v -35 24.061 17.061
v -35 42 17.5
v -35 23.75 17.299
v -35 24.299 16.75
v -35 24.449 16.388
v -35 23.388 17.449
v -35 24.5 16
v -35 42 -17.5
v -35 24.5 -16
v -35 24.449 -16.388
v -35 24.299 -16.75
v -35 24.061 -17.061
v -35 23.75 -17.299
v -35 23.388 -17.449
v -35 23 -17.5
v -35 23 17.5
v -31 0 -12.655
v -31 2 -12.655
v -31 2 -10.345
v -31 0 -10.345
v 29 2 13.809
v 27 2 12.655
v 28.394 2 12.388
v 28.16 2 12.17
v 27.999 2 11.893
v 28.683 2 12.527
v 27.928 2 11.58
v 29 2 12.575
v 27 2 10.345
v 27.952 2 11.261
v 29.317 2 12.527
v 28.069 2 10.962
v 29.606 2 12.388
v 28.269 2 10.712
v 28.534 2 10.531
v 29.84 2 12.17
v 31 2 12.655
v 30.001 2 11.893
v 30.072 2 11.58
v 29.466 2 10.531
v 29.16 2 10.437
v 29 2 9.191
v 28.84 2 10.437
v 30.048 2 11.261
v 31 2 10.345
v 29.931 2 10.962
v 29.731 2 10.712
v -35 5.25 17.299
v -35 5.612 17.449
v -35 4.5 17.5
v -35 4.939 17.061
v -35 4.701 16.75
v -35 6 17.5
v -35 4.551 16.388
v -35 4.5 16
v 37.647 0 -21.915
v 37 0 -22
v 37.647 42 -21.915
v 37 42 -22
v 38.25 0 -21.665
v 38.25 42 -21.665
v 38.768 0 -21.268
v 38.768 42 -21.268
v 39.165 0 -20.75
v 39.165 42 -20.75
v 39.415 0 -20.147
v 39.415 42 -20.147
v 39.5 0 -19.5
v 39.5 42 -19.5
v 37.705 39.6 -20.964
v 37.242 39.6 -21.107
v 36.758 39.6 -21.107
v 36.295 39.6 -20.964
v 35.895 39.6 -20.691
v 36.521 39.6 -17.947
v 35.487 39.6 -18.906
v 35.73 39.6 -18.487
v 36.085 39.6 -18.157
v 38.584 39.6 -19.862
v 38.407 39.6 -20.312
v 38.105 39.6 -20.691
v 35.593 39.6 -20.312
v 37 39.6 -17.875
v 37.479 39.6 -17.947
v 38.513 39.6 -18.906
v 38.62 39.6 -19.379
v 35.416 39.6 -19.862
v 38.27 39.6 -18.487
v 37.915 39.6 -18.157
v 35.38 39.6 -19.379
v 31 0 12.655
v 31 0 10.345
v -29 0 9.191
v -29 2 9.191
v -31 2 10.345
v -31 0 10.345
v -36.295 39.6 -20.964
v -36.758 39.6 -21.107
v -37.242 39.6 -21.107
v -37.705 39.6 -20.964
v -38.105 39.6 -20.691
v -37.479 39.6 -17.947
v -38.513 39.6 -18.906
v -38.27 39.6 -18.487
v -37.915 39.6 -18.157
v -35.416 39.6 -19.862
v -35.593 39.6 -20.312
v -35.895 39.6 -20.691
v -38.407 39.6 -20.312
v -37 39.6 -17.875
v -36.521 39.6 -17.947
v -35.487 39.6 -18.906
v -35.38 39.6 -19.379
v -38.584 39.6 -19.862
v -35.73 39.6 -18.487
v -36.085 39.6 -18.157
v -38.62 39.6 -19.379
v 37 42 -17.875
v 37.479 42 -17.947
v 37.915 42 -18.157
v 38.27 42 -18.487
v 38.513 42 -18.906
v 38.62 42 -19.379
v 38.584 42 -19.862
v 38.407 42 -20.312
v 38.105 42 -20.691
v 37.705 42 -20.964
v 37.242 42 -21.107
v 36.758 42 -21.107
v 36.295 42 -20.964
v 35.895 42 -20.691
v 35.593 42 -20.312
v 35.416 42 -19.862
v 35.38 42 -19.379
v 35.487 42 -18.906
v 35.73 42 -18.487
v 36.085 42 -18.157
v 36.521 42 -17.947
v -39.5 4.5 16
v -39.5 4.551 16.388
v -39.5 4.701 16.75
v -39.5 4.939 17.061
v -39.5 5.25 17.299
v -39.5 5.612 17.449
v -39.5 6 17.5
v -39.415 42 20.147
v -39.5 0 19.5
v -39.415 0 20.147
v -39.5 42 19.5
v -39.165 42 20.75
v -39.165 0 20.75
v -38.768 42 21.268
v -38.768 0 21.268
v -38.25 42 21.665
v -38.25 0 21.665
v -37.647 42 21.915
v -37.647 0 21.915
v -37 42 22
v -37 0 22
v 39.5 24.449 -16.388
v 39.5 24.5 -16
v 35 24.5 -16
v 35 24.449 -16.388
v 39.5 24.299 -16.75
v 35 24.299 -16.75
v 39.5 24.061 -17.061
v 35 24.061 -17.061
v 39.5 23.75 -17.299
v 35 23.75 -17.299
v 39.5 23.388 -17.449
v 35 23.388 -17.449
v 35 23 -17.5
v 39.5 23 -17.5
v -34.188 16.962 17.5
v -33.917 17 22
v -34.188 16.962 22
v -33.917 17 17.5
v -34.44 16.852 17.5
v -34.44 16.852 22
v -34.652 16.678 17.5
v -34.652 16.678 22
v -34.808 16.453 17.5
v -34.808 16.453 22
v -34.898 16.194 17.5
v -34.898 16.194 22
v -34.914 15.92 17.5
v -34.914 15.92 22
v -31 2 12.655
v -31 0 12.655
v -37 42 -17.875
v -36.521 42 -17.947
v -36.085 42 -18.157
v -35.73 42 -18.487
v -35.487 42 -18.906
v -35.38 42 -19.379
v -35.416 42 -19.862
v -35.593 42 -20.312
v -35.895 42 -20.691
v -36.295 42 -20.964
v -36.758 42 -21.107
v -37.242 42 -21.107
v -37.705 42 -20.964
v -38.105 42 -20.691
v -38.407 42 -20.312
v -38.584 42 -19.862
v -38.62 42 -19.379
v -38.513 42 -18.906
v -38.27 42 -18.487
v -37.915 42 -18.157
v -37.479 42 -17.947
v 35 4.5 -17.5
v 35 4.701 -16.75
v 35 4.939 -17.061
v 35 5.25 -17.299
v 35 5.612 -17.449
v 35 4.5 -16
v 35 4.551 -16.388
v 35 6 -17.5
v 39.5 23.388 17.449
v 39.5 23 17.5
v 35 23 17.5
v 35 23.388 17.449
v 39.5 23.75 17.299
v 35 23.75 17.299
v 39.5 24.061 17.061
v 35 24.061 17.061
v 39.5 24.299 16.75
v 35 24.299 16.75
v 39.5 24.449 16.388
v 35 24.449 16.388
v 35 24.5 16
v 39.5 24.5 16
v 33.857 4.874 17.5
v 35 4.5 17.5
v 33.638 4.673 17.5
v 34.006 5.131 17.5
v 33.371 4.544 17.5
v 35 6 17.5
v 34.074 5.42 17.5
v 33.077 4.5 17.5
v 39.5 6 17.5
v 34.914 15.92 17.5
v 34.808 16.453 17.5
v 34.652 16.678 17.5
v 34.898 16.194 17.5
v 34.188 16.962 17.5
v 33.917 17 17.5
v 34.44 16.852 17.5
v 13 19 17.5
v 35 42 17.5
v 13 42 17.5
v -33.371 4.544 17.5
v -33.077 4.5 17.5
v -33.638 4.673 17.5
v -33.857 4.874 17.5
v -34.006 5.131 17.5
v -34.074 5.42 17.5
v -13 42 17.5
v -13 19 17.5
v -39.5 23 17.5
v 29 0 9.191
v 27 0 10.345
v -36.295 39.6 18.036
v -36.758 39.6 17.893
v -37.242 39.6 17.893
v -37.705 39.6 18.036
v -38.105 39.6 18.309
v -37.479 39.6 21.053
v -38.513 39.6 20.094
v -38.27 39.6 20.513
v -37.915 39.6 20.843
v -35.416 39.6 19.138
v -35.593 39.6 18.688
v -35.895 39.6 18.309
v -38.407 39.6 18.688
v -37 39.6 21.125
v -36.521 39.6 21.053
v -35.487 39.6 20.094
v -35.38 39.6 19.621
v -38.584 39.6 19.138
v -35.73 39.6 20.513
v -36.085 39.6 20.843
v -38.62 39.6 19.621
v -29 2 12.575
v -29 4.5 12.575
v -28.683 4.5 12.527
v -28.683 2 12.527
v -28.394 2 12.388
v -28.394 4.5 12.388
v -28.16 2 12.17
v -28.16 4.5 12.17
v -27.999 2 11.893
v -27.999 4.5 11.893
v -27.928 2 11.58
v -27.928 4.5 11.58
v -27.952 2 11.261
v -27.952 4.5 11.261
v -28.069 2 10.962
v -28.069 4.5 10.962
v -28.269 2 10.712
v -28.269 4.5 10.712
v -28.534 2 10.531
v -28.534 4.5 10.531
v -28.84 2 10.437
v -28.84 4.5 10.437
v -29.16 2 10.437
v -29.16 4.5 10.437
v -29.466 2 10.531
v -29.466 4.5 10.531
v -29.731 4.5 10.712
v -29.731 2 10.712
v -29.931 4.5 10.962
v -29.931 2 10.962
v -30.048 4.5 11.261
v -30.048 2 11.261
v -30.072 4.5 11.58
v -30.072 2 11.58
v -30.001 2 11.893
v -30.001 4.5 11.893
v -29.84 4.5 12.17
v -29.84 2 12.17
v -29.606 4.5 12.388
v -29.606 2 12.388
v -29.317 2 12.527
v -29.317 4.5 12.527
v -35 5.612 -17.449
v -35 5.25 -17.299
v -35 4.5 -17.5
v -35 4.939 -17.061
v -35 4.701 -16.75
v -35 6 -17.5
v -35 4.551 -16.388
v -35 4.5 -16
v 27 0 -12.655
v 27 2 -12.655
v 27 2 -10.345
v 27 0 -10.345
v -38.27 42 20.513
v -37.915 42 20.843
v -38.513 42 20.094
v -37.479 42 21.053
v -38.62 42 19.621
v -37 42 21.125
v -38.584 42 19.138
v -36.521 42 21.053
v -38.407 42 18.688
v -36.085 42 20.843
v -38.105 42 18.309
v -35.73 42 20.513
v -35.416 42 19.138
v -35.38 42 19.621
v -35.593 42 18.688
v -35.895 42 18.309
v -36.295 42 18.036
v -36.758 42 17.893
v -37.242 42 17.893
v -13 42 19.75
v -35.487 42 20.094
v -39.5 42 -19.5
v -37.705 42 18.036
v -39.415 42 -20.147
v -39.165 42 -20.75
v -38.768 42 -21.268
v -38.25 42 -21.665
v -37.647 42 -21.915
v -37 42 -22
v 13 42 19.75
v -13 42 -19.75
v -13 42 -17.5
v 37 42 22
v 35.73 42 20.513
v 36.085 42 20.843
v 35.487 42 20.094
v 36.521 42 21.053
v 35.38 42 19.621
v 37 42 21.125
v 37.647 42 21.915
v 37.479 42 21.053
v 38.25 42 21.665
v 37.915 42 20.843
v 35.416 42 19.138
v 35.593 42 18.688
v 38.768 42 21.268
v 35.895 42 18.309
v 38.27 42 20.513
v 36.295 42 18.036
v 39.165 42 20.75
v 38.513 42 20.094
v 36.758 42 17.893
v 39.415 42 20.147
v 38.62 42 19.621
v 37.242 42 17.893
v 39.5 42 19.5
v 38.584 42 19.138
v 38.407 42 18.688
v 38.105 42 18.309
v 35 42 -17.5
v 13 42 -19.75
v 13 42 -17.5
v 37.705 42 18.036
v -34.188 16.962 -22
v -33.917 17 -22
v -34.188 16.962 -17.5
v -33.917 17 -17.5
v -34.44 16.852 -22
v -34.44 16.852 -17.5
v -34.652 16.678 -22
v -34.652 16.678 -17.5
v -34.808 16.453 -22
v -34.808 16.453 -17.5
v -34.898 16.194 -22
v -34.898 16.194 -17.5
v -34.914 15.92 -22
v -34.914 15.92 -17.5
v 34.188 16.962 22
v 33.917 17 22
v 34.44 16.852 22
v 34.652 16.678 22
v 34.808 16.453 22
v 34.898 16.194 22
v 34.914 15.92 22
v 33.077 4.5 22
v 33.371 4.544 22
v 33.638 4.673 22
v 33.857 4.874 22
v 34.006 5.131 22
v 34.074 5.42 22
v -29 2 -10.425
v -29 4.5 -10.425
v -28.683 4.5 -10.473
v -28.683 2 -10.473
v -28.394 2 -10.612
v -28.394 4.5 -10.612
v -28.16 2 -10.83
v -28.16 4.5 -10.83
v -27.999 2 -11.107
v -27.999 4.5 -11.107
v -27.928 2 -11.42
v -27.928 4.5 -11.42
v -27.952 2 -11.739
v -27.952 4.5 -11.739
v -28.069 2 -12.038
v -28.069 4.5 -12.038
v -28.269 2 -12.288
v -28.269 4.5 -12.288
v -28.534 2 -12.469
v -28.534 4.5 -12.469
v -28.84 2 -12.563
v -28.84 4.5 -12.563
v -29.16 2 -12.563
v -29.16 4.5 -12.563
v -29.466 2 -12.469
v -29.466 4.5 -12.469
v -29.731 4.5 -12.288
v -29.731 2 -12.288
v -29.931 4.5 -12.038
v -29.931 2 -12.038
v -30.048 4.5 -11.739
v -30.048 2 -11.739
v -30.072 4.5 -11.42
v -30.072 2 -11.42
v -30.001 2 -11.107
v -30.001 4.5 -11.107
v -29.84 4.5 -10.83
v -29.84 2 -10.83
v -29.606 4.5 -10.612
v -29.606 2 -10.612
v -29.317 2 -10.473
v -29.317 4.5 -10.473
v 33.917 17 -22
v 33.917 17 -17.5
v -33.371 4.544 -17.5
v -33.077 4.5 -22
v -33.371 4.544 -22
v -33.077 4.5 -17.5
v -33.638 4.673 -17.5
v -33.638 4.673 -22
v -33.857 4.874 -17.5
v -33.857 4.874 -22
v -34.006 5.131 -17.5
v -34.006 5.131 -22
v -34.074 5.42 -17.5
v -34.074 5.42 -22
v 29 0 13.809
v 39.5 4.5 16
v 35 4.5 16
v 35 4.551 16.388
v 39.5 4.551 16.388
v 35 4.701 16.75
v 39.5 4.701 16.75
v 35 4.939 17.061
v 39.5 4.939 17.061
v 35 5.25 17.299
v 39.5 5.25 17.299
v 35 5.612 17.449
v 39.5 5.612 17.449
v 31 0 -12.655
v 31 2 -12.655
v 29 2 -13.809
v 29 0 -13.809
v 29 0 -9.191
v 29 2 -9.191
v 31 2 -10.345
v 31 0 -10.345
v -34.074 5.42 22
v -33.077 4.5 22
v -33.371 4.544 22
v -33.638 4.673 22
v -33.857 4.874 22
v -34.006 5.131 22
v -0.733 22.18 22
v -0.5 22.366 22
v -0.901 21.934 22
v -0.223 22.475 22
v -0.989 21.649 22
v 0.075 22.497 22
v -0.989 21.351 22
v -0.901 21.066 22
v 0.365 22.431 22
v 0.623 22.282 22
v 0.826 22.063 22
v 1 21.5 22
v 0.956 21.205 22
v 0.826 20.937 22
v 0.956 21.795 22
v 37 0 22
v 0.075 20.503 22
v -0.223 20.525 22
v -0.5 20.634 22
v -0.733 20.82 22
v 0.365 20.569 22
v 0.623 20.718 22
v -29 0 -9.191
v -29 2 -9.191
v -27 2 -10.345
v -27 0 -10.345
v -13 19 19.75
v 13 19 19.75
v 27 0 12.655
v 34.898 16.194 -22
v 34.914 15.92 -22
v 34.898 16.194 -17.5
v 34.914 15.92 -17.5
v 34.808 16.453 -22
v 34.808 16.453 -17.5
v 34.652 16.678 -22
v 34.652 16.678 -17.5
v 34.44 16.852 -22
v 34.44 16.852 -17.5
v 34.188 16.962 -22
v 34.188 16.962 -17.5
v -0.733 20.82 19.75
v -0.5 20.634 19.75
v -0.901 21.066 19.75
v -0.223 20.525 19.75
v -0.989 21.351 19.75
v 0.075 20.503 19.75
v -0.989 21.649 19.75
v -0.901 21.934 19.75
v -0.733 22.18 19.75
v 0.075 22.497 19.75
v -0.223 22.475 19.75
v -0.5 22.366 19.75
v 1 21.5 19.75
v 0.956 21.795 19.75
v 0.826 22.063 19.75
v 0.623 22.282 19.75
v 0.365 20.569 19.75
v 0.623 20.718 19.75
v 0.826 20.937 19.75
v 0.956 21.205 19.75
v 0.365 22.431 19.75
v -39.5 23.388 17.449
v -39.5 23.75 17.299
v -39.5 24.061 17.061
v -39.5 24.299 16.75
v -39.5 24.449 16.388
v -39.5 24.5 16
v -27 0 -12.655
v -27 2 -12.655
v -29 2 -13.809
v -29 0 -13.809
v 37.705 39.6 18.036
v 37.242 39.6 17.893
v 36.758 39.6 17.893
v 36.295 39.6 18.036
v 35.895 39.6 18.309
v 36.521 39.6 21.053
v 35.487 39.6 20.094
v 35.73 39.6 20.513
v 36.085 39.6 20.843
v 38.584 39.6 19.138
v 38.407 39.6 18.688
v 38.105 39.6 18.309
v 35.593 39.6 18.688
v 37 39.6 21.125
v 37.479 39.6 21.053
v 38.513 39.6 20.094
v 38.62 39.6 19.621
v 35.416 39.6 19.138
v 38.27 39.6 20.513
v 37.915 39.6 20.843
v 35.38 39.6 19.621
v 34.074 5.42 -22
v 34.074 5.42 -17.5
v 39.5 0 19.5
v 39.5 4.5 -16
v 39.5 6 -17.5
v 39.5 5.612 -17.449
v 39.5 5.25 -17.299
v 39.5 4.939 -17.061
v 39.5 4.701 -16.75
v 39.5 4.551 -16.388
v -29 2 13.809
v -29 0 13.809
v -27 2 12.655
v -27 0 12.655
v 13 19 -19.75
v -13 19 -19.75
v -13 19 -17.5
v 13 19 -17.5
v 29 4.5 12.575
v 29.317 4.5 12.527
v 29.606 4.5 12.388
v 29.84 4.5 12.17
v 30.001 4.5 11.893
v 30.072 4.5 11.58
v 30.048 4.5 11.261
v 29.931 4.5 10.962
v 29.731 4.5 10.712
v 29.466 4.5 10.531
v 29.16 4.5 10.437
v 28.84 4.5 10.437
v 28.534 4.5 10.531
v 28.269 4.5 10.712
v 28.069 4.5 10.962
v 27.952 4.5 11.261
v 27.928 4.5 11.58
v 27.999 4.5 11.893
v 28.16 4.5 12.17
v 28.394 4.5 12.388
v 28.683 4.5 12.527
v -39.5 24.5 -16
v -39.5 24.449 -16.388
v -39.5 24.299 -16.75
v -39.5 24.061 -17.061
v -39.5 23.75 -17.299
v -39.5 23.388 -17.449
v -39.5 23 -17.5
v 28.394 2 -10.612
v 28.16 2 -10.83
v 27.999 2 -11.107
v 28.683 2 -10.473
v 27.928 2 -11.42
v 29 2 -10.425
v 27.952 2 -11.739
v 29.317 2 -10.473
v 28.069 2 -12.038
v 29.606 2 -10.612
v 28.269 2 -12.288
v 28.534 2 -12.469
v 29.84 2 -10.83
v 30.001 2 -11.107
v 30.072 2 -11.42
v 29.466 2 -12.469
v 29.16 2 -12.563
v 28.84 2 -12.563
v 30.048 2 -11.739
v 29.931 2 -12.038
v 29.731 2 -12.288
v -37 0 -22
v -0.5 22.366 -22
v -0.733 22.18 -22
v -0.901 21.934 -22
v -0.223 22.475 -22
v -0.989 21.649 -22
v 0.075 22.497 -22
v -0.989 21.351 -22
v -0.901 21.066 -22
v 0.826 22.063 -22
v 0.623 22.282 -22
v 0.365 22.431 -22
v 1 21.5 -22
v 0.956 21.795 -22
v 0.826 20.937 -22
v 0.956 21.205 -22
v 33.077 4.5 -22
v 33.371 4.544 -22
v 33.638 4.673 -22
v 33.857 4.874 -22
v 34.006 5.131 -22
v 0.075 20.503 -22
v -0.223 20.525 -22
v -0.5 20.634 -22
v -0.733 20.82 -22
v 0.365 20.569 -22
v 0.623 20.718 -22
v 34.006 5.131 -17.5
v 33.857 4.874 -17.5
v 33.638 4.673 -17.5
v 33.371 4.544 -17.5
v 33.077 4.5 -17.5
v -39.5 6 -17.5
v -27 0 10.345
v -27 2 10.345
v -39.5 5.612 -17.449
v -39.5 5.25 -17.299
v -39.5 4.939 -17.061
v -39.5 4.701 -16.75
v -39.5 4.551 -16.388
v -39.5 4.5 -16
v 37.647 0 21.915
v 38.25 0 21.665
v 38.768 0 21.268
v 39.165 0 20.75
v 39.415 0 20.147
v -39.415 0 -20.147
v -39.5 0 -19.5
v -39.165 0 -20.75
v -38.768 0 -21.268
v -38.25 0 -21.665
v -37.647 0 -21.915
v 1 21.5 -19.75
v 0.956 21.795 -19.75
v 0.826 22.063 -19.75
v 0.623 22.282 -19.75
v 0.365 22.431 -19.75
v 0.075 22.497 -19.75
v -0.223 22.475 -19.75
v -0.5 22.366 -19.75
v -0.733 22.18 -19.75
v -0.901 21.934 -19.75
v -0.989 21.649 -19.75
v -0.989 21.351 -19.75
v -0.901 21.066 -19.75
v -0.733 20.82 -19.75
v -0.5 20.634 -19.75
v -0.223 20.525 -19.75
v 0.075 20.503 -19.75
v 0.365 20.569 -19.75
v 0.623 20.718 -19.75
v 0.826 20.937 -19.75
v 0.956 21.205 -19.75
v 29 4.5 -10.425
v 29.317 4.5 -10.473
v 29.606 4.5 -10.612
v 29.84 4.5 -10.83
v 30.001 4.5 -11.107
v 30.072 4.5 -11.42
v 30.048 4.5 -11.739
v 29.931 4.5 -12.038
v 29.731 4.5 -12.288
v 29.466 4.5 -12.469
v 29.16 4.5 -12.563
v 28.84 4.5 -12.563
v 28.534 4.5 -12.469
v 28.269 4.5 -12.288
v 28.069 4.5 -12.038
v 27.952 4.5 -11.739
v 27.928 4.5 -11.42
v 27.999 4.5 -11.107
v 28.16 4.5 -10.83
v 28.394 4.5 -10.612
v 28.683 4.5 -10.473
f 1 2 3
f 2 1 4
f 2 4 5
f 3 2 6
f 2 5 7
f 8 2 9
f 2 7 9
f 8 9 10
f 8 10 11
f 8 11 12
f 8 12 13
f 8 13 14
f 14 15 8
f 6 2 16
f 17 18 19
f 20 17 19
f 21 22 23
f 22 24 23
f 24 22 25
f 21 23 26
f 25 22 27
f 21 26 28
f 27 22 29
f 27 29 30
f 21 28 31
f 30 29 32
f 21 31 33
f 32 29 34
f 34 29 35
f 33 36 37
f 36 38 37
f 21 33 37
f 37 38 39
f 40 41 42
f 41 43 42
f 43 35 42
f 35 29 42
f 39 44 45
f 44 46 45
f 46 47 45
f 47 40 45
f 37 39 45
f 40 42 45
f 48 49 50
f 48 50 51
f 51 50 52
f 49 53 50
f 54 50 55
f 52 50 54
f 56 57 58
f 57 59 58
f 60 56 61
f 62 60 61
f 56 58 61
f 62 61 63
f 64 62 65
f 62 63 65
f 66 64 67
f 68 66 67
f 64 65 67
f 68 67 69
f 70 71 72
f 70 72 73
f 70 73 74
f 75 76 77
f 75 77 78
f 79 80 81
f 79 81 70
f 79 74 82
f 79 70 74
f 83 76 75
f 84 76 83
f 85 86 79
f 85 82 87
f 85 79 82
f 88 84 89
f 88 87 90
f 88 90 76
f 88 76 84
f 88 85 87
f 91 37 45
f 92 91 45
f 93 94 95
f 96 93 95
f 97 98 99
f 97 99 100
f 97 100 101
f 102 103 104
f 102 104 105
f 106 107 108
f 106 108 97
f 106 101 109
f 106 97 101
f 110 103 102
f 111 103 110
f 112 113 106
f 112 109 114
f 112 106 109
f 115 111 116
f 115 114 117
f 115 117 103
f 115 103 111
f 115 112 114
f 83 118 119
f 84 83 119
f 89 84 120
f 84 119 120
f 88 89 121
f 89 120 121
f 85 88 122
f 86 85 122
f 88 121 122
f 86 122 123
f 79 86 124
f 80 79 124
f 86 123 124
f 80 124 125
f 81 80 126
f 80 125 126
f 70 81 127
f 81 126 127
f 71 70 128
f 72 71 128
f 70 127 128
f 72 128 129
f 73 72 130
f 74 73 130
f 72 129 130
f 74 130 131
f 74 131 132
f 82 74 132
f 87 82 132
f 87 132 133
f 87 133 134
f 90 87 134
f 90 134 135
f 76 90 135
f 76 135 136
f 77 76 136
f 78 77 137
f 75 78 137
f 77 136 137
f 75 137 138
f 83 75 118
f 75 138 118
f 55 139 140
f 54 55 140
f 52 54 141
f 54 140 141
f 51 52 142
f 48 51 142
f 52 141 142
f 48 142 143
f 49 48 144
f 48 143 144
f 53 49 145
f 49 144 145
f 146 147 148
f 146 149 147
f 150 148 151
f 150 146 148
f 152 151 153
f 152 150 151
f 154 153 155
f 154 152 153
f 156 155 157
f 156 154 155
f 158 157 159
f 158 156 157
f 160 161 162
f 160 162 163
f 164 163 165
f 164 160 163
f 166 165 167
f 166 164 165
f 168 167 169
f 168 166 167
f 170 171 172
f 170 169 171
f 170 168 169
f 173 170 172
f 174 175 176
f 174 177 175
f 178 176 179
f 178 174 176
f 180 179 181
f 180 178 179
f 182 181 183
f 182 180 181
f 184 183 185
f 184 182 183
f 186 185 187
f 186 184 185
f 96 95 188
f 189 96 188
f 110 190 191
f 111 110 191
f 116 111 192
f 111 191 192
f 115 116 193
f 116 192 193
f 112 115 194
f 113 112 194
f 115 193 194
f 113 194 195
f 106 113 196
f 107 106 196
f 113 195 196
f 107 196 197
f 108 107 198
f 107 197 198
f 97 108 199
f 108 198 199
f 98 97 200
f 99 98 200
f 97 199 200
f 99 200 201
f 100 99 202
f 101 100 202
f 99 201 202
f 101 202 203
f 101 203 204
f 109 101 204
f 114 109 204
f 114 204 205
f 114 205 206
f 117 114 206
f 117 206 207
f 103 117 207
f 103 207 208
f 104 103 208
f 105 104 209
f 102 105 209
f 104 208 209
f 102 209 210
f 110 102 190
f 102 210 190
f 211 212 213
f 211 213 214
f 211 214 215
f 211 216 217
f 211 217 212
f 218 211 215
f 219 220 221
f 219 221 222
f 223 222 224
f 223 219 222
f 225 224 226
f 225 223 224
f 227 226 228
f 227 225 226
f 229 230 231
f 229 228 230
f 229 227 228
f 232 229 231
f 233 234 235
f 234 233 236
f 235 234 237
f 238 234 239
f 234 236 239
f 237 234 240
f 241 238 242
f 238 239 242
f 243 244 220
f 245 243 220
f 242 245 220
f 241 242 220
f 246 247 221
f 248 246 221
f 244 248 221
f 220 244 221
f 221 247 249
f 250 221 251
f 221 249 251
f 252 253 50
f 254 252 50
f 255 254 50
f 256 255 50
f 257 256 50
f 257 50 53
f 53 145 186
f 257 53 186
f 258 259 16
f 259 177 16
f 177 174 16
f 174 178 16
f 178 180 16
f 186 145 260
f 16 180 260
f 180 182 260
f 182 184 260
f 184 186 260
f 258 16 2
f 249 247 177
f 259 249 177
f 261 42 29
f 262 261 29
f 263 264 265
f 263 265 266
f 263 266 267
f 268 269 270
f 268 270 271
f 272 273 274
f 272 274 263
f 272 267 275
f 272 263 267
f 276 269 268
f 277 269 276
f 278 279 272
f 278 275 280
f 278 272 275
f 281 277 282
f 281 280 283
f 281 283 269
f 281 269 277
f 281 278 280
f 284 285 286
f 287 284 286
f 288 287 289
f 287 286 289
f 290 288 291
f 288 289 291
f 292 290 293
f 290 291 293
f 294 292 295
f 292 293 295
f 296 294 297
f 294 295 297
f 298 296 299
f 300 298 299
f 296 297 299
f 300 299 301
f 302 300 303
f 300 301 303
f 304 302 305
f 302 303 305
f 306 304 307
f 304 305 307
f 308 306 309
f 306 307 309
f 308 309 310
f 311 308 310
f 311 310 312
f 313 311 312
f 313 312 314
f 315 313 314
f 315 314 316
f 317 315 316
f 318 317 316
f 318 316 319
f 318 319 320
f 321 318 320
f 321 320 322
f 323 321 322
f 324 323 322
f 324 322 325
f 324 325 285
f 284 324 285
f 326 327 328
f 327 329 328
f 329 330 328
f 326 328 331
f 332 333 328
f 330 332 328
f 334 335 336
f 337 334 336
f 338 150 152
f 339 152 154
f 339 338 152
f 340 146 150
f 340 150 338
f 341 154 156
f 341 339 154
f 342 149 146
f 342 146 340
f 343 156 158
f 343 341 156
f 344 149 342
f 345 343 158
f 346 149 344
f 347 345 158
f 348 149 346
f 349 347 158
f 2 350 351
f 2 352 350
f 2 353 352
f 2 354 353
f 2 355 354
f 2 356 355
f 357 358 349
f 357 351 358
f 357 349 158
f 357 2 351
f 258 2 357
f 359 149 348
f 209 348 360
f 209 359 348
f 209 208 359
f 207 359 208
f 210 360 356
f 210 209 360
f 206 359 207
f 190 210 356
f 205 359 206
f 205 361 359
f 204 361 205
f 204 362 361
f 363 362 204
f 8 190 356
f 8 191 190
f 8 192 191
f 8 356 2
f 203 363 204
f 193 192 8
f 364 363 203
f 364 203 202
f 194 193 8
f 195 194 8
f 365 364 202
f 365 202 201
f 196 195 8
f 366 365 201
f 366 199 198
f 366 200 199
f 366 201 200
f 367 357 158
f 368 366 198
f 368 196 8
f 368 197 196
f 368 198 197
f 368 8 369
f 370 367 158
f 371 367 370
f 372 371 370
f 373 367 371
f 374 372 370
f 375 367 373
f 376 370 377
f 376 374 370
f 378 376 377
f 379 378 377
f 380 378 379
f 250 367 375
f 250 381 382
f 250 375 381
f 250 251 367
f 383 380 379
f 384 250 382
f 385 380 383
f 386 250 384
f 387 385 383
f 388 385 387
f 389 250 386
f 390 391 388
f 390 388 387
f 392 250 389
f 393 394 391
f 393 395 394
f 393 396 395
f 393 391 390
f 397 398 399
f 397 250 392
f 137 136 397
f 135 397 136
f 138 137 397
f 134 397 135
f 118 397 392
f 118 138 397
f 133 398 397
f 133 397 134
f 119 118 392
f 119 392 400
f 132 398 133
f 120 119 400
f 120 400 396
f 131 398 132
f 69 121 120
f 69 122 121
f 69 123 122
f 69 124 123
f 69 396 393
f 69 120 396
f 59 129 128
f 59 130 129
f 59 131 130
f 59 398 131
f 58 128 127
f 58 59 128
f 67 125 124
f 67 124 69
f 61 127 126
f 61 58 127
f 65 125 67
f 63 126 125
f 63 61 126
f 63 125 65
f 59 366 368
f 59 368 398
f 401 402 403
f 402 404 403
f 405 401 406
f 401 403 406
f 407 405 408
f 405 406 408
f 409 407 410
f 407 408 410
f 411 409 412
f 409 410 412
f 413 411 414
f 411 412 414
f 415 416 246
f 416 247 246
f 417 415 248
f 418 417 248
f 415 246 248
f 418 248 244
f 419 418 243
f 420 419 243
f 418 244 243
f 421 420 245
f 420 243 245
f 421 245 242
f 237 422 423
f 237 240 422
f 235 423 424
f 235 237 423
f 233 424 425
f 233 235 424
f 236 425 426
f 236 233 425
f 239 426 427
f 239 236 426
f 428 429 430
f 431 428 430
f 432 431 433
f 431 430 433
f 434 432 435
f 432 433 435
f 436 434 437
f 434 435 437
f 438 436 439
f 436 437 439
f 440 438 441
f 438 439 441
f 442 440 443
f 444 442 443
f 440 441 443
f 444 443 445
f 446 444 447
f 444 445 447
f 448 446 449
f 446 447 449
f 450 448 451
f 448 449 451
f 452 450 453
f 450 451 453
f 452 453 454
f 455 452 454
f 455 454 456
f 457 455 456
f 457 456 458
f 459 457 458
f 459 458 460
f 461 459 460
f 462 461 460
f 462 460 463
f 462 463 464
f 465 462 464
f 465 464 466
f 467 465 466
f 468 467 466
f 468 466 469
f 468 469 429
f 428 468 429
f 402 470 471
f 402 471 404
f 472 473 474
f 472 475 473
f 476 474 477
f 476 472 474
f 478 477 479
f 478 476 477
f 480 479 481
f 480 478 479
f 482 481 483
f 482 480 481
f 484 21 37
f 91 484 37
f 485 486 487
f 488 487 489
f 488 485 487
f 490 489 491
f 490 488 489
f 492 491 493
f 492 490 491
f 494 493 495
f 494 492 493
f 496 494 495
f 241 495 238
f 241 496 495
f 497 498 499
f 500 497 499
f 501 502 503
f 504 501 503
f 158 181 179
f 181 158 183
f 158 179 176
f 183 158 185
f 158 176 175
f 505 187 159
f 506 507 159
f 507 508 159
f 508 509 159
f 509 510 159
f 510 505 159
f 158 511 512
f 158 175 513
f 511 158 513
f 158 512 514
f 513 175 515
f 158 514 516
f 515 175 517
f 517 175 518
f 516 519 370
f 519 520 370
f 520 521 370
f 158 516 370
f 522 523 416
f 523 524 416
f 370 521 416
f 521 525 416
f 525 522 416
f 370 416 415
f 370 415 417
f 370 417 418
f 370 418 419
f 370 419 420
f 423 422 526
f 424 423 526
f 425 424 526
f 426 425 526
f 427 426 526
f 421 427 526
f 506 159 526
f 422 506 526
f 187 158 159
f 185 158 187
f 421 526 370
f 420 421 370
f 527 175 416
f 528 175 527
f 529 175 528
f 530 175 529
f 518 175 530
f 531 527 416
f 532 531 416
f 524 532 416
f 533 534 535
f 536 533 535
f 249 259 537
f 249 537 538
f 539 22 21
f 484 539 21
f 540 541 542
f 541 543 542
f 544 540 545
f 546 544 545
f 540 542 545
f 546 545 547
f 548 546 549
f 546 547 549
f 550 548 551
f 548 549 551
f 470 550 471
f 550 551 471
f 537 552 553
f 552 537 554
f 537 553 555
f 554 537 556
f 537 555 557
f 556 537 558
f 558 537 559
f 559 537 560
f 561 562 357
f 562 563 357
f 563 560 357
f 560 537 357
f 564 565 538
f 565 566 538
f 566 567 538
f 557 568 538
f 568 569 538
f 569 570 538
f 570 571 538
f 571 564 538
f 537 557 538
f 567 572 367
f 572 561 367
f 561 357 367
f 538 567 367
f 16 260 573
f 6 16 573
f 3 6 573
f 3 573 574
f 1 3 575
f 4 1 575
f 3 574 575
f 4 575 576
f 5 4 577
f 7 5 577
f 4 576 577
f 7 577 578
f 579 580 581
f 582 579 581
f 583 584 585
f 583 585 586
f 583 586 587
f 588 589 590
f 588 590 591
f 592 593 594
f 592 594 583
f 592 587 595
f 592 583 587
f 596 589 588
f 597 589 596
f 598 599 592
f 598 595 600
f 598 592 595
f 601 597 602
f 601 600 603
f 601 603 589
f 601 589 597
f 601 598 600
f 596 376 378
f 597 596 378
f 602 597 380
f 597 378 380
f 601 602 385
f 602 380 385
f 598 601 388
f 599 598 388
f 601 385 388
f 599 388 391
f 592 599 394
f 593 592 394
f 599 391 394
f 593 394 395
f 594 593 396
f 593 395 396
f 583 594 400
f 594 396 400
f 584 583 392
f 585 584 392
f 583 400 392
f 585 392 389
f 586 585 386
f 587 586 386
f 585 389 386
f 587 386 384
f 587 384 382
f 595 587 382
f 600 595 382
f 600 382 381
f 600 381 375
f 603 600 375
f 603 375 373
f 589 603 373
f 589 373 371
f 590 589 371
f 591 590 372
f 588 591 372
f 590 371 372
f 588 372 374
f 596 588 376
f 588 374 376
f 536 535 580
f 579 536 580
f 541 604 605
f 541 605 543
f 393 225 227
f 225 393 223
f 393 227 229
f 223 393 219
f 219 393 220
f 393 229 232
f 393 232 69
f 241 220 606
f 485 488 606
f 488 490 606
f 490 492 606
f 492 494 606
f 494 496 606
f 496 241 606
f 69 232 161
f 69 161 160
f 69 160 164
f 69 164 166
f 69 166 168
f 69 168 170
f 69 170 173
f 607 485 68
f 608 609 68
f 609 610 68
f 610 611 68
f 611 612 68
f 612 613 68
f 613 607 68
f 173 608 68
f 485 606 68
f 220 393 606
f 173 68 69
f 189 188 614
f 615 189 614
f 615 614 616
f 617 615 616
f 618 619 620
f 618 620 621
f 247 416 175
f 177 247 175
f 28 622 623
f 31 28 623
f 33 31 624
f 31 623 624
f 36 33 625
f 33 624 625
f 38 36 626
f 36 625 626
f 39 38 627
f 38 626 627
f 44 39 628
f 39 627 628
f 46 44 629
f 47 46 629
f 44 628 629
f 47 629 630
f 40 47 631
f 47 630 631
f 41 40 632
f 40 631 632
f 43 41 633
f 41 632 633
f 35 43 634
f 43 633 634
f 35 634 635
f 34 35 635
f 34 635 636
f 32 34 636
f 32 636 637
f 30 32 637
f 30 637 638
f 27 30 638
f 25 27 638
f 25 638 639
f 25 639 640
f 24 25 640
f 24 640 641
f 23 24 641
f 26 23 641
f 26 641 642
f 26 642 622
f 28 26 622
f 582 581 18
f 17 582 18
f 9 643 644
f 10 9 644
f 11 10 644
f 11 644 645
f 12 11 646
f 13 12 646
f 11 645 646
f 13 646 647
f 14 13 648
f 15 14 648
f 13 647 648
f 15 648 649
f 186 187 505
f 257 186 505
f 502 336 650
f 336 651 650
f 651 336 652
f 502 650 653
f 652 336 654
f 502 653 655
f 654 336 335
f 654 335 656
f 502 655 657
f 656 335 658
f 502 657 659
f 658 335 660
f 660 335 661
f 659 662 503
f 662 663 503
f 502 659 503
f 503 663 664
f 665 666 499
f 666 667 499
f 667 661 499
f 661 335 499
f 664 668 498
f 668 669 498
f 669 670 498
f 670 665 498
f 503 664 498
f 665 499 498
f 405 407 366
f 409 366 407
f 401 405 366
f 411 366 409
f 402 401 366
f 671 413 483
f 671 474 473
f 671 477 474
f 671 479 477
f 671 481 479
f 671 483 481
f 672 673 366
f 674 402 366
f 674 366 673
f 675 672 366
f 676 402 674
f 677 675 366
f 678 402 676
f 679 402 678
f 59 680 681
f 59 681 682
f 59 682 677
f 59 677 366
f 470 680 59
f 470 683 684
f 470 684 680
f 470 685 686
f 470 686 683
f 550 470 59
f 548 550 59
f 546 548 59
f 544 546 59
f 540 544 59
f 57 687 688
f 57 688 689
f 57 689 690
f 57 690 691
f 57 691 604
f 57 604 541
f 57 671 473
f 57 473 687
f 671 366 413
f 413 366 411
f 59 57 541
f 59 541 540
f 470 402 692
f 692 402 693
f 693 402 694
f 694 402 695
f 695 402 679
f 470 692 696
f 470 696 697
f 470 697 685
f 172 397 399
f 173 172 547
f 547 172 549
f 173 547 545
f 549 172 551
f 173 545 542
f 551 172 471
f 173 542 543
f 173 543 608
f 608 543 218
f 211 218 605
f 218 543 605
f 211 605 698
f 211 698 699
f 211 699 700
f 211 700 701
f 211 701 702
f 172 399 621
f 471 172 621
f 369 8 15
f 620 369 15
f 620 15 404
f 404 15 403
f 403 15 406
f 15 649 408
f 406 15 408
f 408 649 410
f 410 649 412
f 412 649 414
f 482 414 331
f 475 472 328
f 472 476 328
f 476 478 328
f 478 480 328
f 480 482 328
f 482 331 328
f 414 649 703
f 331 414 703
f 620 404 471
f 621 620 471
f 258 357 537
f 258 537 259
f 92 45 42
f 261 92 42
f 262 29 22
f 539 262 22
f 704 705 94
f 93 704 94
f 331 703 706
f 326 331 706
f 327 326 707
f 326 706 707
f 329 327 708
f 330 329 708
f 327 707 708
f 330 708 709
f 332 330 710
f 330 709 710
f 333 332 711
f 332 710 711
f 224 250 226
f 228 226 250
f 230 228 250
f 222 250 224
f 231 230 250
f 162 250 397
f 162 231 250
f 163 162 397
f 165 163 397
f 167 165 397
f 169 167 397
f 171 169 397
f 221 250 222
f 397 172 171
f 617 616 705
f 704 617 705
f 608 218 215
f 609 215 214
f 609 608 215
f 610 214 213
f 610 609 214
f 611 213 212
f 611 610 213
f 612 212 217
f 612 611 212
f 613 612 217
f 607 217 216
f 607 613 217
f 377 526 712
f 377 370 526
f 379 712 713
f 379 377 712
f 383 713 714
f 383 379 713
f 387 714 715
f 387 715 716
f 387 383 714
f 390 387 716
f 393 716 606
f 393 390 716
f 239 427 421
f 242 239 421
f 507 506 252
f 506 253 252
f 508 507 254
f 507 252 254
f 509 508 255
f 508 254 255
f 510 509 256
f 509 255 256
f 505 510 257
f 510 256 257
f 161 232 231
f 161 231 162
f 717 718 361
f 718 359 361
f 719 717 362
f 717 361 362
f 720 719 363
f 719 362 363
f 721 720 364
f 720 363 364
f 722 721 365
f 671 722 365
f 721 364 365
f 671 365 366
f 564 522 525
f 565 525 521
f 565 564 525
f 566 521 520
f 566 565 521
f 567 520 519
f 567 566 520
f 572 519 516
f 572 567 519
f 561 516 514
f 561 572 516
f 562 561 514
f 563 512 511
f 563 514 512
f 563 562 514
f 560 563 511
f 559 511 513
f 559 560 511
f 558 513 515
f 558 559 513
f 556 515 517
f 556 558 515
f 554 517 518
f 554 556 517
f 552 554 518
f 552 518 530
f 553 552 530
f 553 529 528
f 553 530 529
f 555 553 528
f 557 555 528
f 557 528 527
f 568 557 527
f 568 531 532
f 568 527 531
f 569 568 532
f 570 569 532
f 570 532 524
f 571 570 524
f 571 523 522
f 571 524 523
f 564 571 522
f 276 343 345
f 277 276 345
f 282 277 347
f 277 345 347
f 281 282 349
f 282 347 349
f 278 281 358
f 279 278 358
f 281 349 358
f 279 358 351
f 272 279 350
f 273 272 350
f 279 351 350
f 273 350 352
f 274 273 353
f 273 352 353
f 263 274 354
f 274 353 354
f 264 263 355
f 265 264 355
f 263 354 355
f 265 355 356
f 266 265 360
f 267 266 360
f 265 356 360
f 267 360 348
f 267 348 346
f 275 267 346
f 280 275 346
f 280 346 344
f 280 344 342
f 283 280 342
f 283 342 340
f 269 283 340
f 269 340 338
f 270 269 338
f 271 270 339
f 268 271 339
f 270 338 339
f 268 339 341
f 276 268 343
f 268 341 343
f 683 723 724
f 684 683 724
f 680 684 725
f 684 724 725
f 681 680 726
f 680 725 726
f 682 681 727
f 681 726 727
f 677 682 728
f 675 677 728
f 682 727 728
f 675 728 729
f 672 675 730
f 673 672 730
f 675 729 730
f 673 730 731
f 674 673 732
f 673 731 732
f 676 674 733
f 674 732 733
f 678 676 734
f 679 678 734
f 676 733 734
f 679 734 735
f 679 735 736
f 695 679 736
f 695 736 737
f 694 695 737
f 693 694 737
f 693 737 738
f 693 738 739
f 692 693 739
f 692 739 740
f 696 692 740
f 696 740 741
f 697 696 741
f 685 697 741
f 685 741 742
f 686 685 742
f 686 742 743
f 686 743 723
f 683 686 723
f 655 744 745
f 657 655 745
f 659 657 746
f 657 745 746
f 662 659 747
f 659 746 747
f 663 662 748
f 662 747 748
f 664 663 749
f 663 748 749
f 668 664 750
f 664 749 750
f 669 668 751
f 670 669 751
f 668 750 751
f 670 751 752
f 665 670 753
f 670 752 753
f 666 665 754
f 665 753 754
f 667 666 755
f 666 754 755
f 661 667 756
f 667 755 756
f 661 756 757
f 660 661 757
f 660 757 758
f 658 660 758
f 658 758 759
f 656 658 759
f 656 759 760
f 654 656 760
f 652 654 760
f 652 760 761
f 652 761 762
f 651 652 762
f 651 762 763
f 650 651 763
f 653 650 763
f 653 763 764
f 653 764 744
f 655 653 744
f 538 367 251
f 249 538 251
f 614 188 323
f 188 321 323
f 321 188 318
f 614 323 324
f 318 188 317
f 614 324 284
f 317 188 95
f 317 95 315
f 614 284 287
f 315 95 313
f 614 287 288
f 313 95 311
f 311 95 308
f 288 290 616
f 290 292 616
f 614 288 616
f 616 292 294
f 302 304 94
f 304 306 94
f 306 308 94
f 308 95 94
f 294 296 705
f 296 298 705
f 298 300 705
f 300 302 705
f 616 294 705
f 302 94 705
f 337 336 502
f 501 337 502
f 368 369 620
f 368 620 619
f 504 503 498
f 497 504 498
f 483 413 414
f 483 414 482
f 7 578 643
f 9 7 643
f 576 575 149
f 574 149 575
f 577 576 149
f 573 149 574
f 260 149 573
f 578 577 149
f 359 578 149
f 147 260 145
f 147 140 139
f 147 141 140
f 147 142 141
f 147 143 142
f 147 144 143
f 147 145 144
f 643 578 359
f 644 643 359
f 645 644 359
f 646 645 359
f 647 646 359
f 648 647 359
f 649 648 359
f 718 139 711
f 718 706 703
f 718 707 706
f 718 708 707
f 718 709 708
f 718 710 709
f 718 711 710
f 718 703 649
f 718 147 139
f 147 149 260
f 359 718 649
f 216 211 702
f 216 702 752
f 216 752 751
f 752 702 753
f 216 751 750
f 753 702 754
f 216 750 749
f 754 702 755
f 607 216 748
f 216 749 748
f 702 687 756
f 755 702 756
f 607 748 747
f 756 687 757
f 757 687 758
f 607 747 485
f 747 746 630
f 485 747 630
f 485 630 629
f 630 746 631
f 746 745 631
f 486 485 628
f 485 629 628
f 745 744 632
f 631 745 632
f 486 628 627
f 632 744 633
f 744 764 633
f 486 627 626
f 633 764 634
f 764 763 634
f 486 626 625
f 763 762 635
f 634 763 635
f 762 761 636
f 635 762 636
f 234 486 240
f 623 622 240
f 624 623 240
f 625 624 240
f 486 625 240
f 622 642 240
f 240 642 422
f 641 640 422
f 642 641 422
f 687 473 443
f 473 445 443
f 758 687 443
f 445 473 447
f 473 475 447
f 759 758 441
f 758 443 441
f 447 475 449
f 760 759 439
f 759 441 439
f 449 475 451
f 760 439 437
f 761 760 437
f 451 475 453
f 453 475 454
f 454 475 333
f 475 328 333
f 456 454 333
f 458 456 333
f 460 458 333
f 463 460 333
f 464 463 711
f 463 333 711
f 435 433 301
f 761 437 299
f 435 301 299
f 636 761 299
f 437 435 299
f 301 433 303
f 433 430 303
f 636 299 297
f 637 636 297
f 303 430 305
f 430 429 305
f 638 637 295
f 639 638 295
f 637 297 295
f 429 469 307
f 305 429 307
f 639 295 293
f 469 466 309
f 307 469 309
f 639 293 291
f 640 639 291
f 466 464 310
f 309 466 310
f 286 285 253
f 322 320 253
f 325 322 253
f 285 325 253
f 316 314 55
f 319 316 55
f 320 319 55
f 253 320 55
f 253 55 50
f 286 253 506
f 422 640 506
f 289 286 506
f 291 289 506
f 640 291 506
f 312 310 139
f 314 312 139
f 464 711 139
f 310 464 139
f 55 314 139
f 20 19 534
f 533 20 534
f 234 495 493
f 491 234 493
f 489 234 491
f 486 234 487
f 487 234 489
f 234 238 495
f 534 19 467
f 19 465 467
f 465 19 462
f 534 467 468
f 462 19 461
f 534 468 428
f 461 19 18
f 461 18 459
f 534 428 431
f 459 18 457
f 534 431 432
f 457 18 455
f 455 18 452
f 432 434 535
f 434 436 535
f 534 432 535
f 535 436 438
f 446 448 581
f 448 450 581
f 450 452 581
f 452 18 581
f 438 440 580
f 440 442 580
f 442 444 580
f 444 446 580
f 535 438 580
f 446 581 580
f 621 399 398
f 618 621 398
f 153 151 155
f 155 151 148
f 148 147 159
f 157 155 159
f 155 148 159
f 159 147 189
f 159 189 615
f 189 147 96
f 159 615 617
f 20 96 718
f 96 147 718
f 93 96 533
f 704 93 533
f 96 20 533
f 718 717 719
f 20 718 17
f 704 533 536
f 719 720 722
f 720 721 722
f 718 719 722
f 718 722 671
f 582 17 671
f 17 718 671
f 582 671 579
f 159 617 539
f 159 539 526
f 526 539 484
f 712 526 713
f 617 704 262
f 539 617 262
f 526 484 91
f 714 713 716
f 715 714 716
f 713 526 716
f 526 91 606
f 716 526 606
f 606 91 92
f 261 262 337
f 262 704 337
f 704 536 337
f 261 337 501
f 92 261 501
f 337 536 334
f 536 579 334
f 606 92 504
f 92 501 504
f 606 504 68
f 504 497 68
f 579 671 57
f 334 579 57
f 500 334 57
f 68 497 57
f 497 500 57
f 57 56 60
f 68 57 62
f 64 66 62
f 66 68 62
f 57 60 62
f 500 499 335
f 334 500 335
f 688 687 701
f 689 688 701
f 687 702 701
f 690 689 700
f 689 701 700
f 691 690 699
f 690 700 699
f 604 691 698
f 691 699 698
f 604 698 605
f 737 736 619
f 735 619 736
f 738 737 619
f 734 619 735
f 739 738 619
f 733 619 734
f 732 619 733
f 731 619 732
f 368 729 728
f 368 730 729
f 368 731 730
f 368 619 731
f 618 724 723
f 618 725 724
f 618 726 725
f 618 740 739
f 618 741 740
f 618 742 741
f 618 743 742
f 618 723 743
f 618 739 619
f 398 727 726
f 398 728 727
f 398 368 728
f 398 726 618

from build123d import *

# Parameters (mm, degrees)
BASE_W               = 79
BASE_H               = 44
BASE_R               = 1.075
BOSS_EXTRUDE1_DEPTH  = 42
SHELL1_T             = -4.5
CUT_EXTRUDE2_START   = 4.5
BASE_7_R             = 1.075
CUT_EXTRUDE2_DEPTH   = 67.211020086
CUT_EXTRUDE3_START   = 2
BASE_8_R             = 1.075
CUT_EXTRUDE3_DEPTH   = 2
SKETCH3_W            = 26
SKETCH3_H            = 39.5
CUT_EXTRUDE4_DEPTH   = 23
FILLET1_R            = 2.5
CUT_EXTRUDE5_DEPTH   = 39.5
CUT_EXTRUDE6_DEPTH   = 74.5
FILLET2_R            = 1
MOUNT_R              = 1.625
CUT_EXTRUDE7_DEPTH   = 2.4
CUT_EXTRUDE8_START   = -2.25
CAMERA_MOUNT_HOLE_R  = 1
CUT_EXTRUDE8_DEPTH   = 75.777581073
FILLET2_OF_MIRROR3_R = 1


with BuildPart() as part:
    # Base → Boss-Extrude1 (new body)
    # profile 1 of 9: a face of its own
    with BuildSketch(Plane(origin=(0, 0, 0), x_dir=(1, 0, 0), z_dir=(0, 1, 0))):
        Rectangle(BASE_W, BASE_H)
        Polygon((27, -10.345299462), (27, -12.654700538), (29, -13.809401077), (31, -12.654700538), (31, -10.345299462), (29, -9.190598923), align=None, mode=Mode.SUBTRACT)
        Polygon((-31, -10.345299462), (-31, -12.654700538), (-29, -13.809401077), (-27, -12.654700538), (-27, -10.345299462), (-29, -9.190598923), align=None, mode=Mode.SUBTRACT)
        Polygon((-31, 12.654700538), (-31, 10.345299462), (-29, 9.190598923), (-27, 10.345299462), (-27, 12.654700538), (-29, 13.809401077), align=None, mode=Mode.SUBTRACT)
        Polygon((27, 12.654700538), (27, 10.345299462), (29, 9.190598923), (31, 10.345299462), (31, 12.654700538), (29, 13.809401077), align=None, mode=Mode.SUBTRACT)
    # profile 2 of 9: a face of its own
    with BuildSketch(Plane(origin=(0, 0, 0), x_dir=(1, 0, 0), z_dir=(0, 1, 0))):
        Polygon((-29, -9.190598923), (-31, -10.345299462), (-31, -12.654700538), (-29, -13.809401077), (-27, -12.654700538), (-27, -10.345299462), align=None)
        with Locations((-29, -11.5)):
            Circle(BASE_R, mode=Mode.SUBTRACT)
    # profile 3 of 9: a face of its own
    with BuildSketch(Plane(origin=(0, 0, 0), x_dir=(1, 0, 0), z_dir=(0, 1, 0))):
        with Locations((-29, -11.5)):
            Circle(BASE_R)
    # profile 4 of 9: a face of its own
    with BuildSketch(Plane(origin=(0, 0, 0), x_dir=(1, 0, 0), z_dir=(0, 1, 0))):
        Polygon((-29, 13.809401077), (-31, 12.654700538), (-31, 10.345299462), (-29, 9.190598923), (-27, 10.345299462), (-27, 12.654700538), align=None)
        with Locations((-29, 11.5)):
            Circle(BASE_R, mode=Mode.SUBTRACT)
    # profile 5 of 9: a face of its own
    with BuildSketch(Plane(origin=(0, 0, 0), x_dir=(1, 0, 0), z_dir=(0, 1, 0))):
        with Locations((-29, 11.5)):
            Circle(BASE_R)
    # profile 6 of 9: a face of its own
    with BuildSketch(Plane(origin=(0, 0, 0), x_dir=(1, 0, 0), z_dir=(0, 1, 0))):
        Polygon((29, -9.190598923), (27, -10.345299462), (27, -12.654700538), (29, -13.809401077), (31, -12.654700538), (31, -10.345299462), align=None)
        with Locations((29, -11.5)):
            Circle(BASE_R, mode=Mode.SUBTRACT)
    # profile 7 of 9: a face of its own
    with BuildSketch(Plane(origin=(0, 0, 0), x_dir=(1, 0, 0), z_dir=(0, 1, 0))):
        with Locations((29, -11.5)):
            Circle(BASE_R)
    # profile 8 of 9: a face of its own
    with BuildSketch(Plane(origin=(0, 0, 0), x_dir=(1, 0, 0), z_dir=(0, 1, 0))):
        Polygon((29, 13.809401077), (27, 12.654700538), (27, 10.345299462), (29, 9.190598923), (31, 10.345299462), (31, 12.654700538), align=None)
        with Locations((29, 11.5)):
            Circle(BASE_R, mode=Mode.SUBTRACT)
    # profile 9 of 9: a face of its own
    with BuildSketch(Plane(origin=(0, 0, 0), x_dir=(1, 0, 0), z_dir=(0, 1, 0))):
        with Locations((29, 11.5)):
            Circle(BASE_R)
    extrude(amount=BOSS_EXTRUDE1_DEPTH)

    # Shell1
    shell1_openings = [part.faces().sort_by_distance(p)[0] for p in [
        (0, 42, 0),
    ]]
    offset(amount=SHELL1_T, openings=shell1_openings, kind=Kind.INTERSECTION)

    # Base<7> → Cut-Extrude2 (cut, through all)
    with BuildSketch(Plane(origin=(0, 0, 0), x_dir=(1, 0, 0), z_dir=(0, 1, 0)).offset(CUT_EXTRUDE2_START)):
        with Locations(Location((-29, -11.5, 0), (0, 0, 270))):
            Circle(BASE_7_R)
        with Locations(Location((-29, 11.5, 0), (0, 0, 270))):
            Circle(BASE_7_R)
        with Locations(Location((29, -11.5, 0), (0, 0, 270))):
            Circle(BASE_7_R)
        with Locations(Location((29, 11.5, 0), (0, 0, 270))):
            Circle(BASE_7_R)
    extrude(amount=-CUT_EXTRUDE2_DEPTH, mode=Mode.SUBTRACT)

    # Base<8> → Cut-Extrude3 (cut)
    # profile 1 of 4: a face of its own
    with BuildSketch(Plane(origin=(0, 0, 0), x_dir=(1, 0, 0), z_dir=(0, 1, 0)).offset(CUT_EXTRUDE3_START)):
        Polygon((29, 13.809401077), (27, 12.654700538), (27, 10.345299462), (29, 9.190598923), (31, 10.345299462), (31, 12.654700538), align=None)
        with Locations(Location((29, 11.5, 0), (0, 0, 270))):
            Circle(BASE_8_R, mode=Mode.SUBTRACT)
    # profile 2 of 4: a face of its own
    with BuildSketch(Plane(origin=(0, 0, 0), x_dir=(1, 0, 0), z_dir=(0, 1, 0)).offset(CUT_EXTRUDE3_START)):
        Polygon((29, -9.190598923), (27, -10.345299462), (27, -12.654700538), (29, -13.809401077), (31, -12.654700538), (31, -10.345299462), align=None)
        with Locations(Location((29, -11.5, 0), (0, 0, 270))):
            Circle(BASE_8_R, mode=Mode.SUBTRACT)
    # profile 3 of 4: a face of its own
    with BuildSketch(Plane(origin=(0, 0, 0), x_dir=(1, 0, 0), z_dir=(0, 1, 0)).offset(CUT_EXTRUDE3_START)):
        Polygon((-29, -9.190598923), (-31, -10.345299462), (-31, -12.654700538), (-29, -13.809401077), (-27, -12.654700538), (-27, -10.345299462), align=None)
        with Locations(Location((-29, -11.5, 0), (0, 0, 270))):
            Circle(BASE_8_R, mode=Mode.SUBTRACT)
    # profile 4 of 4: a face of its own
    with BuildSketch(Plane(origin=(0, 0, 0), x_dir=(1, 0, 0), z_dir=(0, 1, 0)).offset(CUT_EXTRUDE3_START)):
        Polygon((-29, 13.809401077), (-31, 12.654700538), (-31, 10.345299462), (-29, 9.190598923), (-27, 10.345299462), (-27, 12.654700538), align=None)
        with Locations(Location((-29, 11.5, 0), (0, 0, 270))):
            Circle(BASE_8_R, mode=Mode.SUBTRACT)
    extrude(amount=-CUT_EXTRUDE3_DEPTH, mode=Mode.SUBTRACT)

    # Sketch3 → Cut-Extrude4 (cut)
    with BuildSketch(Plane(origin=(0, 42, 0), x_dir=(1, 0, 0), z_dir=(0, 1, 0))):
        Rectangle(SKETCH3_W, SKETCH3_H)
    extrude(amount=-CUT_EXTRUDE4_DEPTH, mode=Mode.SUBTRACT)

    # Fillet1
    fillet1_edges = [part.edges().sort_by_distance(p)[0] for p in [
        (39.5, 21, 22),
        (-39.5, 21, 22),
        (-39.5, 21, -22),
        (39.5, 21, -22),
    ]]
    fillet(fillet1_edges, radius=FILLET1_R)

    # INPUTS → Cut-Extrude5 (cut)
    with BuildSketch(Plane.XY.offset(22)):
        Polygon((-35, 17), (-34, 4.5), (34, 4.5), (35, 17), align=None)
    cut_extrude5 = extrude(amount=-CUT_EXTRUDE5_DEPTH, mode=Mode.SUBTRACT)

    # SD_CARD → Cut-Extrude6 (cut)
    with BuildSketch(Plane.ZY.offset(39.5)):
        with BuildLine():
            Line((-16, 4.5), (16, 4.5))
            ThreePointArc((16, 4.5), (17.060660172, 4.939339828), (17.5, 6))
            Line((17.5, 6), (17.5, 23))
            ThreePointArc((17.5, 23), (17.060660172, 24.060660172), (16, 24.5))
            Line((16, 24.5), (-16, 24.5))
            ThreePointArc((-16, 24.5), (-17.060660172, 24.060660172), (-17.5, 23))
            Line((-17.5, 23), (-17.5, 6))
            ThreePointArc((-17.5, 6), (-17.060660172, 4.939339828), (-16, 4.5))
        make_face()
    cut_extrude6 = extrude(amount=-CUT_EXTRUDE6_DEPTH, mode=Mode.SUBTRACT)

    # Fillet2
    fillet2_edges = [part.edges().sort_by_distance(p)[0] for p in [
        (34, 4.5, 19.75),
        (35, 17, 19.75),
        (-35, 17, 19.75),
        (-34, 4.5, 19.75),
    ]]
    fillet(fillet2_edges, radius=FILLET2_R)

    # Mirror1: Cut-Extrude6 across plane
    add(cut_extrude6.mirror(Plane.ZY), mode=Mode.SUBTRACT)

    # Mount → Cut-Extrude7 (cut)
    with BuildSketch(Plane(origin=(0, 42, 0), x_dir=(1, 0, 0), z_dir=(0, 1, 0))):
        with Locations(Location((-37, 19.5, 0), (0, 0, 270))):
            Circle(MOUNT_R)
        with Locations(Location((37, 19.5, 0), (0, 0, 270))):
            Circle(MOUNT_R)
        with Locations(Location((37, -19.5, 0), (0, 0, 270))):
            Circle(MOUNT_R)
        with Locations(Location((-37, -19.5, 0), (0, 0, 270))):
            Circle(MOUNT_R)
    extrude(amount=-CUT_EXTRUDE7_DEPTH, mode=Mode.SUBTRACT)

    # Camera_Mount_Hole → Cut-Extrude8 (cut)
    with BuildSketch(Plane.XY.offset(22).offset(CUT_EXTRUDE8_START)):
        with Locations((0, 21.5)):
            Circle(CAMERA_MOUNT_HOLE_R)
    cut_extrude8 = extrude(amount=CUT_EXTRUDE8_DEPTH, mode=Mode.SUBTRACT)

    # Mirror2: Cut-Extrude8 across plane
    add(cut_extrude8.mirror(Plane.XY), mode=Mode.SUBTRACT)

    # Mirror3: Cut-Extrude5 across plane
    add(cut_extrude5.mirror(Plane.XY), mode=Mode.SUBTRACT)

    # Fillet2 of Mirror3
    fillet2_of_mirror3_edges = [part.edges().sort_by_distance(p)[0] for p in [
        (34, 4.5, -19.75),
        (35, 17, -19.75),
        (-35, 17, -19.75),
        (-34, 4.5, -19.75),
    ]]
    fillet(fillet2_of_mirror3_edges, radius=FILLET2_OF_MIRROR3_R)


solid = part.part
